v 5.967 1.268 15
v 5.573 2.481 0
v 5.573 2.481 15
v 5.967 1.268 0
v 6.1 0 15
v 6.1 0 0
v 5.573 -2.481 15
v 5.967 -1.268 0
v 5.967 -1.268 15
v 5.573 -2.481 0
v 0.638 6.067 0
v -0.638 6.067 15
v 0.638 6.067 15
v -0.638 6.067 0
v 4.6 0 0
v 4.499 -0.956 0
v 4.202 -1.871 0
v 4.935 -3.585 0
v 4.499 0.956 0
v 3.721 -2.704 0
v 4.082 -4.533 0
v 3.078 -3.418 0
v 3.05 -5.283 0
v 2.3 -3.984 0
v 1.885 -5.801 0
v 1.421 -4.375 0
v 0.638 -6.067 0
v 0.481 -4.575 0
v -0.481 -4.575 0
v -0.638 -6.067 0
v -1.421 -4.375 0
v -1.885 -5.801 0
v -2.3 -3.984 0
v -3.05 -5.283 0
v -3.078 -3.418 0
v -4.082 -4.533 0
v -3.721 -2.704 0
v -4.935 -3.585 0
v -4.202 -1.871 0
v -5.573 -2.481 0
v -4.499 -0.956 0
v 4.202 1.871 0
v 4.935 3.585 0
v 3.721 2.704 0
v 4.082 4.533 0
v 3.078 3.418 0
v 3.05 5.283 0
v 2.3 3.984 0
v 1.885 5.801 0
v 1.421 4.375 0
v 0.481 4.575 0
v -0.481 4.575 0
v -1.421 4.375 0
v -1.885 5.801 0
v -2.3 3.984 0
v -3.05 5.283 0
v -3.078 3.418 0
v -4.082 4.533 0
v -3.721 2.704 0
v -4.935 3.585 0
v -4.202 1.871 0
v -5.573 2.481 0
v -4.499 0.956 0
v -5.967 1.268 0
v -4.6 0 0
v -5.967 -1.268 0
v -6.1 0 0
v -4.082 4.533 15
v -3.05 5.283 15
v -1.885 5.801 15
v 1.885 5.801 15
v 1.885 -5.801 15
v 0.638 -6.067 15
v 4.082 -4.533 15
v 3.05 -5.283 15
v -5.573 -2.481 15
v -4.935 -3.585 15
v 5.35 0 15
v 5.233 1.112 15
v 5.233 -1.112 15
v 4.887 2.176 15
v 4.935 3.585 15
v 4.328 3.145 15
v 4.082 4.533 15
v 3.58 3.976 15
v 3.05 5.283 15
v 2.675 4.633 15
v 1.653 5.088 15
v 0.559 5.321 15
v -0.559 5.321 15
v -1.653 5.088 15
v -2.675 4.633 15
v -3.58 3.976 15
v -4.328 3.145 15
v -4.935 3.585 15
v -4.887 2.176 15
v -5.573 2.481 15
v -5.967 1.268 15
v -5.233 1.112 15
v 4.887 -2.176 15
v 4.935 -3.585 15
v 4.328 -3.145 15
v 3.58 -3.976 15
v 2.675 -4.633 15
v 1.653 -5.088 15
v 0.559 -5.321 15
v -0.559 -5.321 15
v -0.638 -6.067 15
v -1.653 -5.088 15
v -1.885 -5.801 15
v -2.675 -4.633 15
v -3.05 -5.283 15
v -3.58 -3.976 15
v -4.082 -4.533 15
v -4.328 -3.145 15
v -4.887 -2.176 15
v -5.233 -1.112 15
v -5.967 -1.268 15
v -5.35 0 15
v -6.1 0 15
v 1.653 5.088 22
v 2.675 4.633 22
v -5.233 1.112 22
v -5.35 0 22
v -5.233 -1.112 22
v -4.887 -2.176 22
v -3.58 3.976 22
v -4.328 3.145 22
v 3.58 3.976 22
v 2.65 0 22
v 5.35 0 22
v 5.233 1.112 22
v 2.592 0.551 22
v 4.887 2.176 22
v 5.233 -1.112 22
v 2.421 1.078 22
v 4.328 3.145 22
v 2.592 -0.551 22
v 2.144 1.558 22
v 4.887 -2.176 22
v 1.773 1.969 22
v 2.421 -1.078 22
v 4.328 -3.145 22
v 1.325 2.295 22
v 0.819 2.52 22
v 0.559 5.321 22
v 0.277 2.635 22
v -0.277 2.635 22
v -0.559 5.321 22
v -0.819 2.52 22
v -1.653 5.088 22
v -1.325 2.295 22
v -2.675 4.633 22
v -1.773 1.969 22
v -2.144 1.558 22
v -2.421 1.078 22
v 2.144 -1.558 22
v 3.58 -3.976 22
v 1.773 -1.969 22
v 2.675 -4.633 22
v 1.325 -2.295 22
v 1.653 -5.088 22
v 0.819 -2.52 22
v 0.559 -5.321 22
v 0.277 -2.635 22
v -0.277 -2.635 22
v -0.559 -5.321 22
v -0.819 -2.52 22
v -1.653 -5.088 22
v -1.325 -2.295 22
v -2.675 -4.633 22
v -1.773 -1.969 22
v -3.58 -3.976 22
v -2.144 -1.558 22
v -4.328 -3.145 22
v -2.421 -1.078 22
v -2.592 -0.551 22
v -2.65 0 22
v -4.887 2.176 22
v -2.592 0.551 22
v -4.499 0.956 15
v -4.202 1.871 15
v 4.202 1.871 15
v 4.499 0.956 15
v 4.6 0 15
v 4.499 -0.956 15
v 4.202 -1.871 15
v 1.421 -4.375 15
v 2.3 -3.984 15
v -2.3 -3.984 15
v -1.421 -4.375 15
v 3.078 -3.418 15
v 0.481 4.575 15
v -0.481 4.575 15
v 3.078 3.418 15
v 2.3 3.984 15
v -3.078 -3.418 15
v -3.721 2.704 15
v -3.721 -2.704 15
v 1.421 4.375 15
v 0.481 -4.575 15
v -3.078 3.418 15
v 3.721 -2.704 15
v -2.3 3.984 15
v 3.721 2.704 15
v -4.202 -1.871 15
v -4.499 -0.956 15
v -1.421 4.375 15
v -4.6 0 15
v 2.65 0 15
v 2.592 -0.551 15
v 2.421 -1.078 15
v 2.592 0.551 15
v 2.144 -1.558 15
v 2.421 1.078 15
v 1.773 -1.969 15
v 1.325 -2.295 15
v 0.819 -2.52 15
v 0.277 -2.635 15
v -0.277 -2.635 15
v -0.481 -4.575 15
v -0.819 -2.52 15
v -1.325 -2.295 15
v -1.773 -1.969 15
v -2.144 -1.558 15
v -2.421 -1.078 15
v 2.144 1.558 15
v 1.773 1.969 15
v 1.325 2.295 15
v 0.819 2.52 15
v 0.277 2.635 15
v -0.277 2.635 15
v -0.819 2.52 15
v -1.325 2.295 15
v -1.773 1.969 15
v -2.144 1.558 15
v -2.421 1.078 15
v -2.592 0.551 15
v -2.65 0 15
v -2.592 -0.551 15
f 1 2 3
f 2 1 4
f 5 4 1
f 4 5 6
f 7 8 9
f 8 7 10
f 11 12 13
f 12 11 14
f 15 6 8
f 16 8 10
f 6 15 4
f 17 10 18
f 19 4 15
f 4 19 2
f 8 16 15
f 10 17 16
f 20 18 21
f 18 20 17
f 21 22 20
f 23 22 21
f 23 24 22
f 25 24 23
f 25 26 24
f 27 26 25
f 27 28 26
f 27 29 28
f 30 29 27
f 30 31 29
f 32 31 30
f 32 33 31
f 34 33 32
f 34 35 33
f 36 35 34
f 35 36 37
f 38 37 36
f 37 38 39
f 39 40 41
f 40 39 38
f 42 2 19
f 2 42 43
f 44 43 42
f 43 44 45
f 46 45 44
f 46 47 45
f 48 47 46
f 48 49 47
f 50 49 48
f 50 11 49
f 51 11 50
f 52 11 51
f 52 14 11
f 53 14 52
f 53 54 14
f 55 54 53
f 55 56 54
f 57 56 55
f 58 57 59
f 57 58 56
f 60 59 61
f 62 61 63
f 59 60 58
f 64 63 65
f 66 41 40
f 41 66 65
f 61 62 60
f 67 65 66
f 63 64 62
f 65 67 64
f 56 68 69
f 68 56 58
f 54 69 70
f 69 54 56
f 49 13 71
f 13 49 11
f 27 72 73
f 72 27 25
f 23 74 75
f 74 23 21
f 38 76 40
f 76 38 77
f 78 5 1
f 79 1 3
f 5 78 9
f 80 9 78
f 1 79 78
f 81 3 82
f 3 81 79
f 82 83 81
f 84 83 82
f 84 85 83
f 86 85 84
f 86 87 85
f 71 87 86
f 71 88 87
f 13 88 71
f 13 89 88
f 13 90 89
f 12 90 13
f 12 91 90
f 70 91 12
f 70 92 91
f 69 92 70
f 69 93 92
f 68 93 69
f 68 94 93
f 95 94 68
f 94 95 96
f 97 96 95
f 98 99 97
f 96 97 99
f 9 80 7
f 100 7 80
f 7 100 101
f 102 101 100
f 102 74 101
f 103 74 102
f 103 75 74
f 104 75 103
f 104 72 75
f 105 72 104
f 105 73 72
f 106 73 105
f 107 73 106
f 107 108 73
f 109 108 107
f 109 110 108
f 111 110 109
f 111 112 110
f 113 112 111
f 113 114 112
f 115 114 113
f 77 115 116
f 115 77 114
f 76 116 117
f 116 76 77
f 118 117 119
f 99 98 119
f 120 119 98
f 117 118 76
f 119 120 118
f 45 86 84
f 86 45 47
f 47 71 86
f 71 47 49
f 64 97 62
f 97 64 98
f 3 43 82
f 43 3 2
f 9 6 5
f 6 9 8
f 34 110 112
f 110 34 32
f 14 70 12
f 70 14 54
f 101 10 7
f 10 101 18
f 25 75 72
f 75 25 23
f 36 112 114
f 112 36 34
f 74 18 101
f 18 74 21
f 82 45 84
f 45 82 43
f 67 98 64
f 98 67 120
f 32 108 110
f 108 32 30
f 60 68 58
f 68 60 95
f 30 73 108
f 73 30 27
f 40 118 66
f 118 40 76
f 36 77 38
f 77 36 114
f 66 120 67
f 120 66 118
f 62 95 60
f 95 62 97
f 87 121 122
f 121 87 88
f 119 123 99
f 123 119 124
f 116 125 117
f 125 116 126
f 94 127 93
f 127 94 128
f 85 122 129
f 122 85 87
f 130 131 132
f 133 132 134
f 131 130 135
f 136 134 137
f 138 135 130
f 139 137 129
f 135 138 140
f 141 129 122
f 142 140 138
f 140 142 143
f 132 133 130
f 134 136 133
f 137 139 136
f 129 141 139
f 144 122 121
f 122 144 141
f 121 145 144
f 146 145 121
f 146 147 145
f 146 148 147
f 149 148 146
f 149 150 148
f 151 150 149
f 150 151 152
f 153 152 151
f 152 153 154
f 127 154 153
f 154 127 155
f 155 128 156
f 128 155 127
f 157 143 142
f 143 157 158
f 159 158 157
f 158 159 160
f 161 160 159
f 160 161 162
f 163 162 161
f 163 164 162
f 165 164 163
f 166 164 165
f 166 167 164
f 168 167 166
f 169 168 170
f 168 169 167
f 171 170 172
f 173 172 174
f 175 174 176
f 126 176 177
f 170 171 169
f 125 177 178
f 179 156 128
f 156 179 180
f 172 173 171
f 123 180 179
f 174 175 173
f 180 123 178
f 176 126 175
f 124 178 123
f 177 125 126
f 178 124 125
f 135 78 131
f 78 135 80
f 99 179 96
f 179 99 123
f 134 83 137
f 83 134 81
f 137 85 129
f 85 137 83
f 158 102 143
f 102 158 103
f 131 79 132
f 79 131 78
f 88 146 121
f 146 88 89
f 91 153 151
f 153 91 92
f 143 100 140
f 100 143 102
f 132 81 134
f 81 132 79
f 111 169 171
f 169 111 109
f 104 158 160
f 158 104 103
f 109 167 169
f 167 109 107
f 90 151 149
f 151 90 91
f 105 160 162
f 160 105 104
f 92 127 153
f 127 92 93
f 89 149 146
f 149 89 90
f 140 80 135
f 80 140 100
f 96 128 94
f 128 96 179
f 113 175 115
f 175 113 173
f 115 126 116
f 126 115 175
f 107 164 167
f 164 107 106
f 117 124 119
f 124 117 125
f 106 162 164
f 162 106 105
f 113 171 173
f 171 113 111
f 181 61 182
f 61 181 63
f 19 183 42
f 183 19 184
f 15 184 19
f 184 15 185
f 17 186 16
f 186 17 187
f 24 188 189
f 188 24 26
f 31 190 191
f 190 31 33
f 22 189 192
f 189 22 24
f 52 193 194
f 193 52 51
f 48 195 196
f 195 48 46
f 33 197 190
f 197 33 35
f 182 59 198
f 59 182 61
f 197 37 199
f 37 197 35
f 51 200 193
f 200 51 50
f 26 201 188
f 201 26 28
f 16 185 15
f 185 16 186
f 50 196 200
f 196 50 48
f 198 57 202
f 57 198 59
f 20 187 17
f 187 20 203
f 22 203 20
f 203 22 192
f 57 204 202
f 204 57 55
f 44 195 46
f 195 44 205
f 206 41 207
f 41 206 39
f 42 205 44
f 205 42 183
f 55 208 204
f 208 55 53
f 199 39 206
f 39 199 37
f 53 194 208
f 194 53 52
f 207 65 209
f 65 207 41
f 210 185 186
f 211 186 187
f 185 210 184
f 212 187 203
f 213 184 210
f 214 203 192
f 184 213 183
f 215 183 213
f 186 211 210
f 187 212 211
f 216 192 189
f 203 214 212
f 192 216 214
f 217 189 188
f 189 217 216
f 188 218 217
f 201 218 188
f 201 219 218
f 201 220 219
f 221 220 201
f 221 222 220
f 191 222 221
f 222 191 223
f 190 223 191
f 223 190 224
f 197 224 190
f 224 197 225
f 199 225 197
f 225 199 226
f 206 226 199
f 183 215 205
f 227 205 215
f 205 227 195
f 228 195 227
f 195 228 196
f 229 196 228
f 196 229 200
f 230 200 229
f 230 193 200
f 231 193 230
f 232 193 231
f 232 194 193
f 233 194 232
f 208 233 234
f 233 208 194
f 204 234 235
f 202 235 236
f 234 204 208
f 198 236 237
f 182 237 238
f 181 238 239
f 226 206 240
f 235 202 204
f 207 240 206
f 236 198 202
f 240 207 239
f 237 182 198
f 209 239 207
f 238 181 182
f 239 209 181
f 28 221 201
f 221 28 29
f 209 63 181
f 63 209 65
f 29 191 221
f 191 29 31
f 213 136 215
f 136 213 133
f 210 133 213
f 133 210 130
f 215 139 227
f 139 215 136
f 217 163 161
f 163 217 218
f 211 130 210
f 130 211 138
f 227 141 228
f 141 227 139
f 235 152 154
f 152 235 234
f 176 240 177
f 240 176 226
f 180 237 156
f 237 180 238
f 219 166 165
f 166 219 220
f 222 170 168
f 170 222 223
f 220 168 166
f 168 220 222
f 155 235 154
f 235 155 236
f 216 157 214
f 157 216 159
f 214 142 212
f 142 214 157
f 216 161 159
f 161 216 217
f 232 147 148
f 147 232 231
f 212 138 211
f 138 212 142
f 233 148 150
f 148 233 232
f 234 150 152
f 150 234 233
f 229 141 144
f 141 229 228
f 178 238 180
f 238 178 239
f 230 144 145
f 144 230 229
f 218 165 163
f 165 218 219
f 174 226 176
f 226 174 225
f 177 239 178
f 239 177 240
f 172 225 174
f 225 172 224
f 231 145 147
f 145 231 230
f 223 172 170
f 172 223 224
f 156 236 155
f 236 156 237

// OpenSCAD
r1i  = 4.6;
r1o  = r1i+1.5;
h1  = 15.0;

r2i = 2.65;
r2o = r2i + 2.7;
h2  = 7.0;

$fn=30;

difference() {
  union() {
    cylinder( h=h1, r=r1o );
    translate( [0,0,h1] ) cylinder( h=h2, r=r2o );
  }
  cylinder( h=h1, r=r1i );
  translate( [0,0,h1] ) cylinder( h=h2, r=r2i );
}
